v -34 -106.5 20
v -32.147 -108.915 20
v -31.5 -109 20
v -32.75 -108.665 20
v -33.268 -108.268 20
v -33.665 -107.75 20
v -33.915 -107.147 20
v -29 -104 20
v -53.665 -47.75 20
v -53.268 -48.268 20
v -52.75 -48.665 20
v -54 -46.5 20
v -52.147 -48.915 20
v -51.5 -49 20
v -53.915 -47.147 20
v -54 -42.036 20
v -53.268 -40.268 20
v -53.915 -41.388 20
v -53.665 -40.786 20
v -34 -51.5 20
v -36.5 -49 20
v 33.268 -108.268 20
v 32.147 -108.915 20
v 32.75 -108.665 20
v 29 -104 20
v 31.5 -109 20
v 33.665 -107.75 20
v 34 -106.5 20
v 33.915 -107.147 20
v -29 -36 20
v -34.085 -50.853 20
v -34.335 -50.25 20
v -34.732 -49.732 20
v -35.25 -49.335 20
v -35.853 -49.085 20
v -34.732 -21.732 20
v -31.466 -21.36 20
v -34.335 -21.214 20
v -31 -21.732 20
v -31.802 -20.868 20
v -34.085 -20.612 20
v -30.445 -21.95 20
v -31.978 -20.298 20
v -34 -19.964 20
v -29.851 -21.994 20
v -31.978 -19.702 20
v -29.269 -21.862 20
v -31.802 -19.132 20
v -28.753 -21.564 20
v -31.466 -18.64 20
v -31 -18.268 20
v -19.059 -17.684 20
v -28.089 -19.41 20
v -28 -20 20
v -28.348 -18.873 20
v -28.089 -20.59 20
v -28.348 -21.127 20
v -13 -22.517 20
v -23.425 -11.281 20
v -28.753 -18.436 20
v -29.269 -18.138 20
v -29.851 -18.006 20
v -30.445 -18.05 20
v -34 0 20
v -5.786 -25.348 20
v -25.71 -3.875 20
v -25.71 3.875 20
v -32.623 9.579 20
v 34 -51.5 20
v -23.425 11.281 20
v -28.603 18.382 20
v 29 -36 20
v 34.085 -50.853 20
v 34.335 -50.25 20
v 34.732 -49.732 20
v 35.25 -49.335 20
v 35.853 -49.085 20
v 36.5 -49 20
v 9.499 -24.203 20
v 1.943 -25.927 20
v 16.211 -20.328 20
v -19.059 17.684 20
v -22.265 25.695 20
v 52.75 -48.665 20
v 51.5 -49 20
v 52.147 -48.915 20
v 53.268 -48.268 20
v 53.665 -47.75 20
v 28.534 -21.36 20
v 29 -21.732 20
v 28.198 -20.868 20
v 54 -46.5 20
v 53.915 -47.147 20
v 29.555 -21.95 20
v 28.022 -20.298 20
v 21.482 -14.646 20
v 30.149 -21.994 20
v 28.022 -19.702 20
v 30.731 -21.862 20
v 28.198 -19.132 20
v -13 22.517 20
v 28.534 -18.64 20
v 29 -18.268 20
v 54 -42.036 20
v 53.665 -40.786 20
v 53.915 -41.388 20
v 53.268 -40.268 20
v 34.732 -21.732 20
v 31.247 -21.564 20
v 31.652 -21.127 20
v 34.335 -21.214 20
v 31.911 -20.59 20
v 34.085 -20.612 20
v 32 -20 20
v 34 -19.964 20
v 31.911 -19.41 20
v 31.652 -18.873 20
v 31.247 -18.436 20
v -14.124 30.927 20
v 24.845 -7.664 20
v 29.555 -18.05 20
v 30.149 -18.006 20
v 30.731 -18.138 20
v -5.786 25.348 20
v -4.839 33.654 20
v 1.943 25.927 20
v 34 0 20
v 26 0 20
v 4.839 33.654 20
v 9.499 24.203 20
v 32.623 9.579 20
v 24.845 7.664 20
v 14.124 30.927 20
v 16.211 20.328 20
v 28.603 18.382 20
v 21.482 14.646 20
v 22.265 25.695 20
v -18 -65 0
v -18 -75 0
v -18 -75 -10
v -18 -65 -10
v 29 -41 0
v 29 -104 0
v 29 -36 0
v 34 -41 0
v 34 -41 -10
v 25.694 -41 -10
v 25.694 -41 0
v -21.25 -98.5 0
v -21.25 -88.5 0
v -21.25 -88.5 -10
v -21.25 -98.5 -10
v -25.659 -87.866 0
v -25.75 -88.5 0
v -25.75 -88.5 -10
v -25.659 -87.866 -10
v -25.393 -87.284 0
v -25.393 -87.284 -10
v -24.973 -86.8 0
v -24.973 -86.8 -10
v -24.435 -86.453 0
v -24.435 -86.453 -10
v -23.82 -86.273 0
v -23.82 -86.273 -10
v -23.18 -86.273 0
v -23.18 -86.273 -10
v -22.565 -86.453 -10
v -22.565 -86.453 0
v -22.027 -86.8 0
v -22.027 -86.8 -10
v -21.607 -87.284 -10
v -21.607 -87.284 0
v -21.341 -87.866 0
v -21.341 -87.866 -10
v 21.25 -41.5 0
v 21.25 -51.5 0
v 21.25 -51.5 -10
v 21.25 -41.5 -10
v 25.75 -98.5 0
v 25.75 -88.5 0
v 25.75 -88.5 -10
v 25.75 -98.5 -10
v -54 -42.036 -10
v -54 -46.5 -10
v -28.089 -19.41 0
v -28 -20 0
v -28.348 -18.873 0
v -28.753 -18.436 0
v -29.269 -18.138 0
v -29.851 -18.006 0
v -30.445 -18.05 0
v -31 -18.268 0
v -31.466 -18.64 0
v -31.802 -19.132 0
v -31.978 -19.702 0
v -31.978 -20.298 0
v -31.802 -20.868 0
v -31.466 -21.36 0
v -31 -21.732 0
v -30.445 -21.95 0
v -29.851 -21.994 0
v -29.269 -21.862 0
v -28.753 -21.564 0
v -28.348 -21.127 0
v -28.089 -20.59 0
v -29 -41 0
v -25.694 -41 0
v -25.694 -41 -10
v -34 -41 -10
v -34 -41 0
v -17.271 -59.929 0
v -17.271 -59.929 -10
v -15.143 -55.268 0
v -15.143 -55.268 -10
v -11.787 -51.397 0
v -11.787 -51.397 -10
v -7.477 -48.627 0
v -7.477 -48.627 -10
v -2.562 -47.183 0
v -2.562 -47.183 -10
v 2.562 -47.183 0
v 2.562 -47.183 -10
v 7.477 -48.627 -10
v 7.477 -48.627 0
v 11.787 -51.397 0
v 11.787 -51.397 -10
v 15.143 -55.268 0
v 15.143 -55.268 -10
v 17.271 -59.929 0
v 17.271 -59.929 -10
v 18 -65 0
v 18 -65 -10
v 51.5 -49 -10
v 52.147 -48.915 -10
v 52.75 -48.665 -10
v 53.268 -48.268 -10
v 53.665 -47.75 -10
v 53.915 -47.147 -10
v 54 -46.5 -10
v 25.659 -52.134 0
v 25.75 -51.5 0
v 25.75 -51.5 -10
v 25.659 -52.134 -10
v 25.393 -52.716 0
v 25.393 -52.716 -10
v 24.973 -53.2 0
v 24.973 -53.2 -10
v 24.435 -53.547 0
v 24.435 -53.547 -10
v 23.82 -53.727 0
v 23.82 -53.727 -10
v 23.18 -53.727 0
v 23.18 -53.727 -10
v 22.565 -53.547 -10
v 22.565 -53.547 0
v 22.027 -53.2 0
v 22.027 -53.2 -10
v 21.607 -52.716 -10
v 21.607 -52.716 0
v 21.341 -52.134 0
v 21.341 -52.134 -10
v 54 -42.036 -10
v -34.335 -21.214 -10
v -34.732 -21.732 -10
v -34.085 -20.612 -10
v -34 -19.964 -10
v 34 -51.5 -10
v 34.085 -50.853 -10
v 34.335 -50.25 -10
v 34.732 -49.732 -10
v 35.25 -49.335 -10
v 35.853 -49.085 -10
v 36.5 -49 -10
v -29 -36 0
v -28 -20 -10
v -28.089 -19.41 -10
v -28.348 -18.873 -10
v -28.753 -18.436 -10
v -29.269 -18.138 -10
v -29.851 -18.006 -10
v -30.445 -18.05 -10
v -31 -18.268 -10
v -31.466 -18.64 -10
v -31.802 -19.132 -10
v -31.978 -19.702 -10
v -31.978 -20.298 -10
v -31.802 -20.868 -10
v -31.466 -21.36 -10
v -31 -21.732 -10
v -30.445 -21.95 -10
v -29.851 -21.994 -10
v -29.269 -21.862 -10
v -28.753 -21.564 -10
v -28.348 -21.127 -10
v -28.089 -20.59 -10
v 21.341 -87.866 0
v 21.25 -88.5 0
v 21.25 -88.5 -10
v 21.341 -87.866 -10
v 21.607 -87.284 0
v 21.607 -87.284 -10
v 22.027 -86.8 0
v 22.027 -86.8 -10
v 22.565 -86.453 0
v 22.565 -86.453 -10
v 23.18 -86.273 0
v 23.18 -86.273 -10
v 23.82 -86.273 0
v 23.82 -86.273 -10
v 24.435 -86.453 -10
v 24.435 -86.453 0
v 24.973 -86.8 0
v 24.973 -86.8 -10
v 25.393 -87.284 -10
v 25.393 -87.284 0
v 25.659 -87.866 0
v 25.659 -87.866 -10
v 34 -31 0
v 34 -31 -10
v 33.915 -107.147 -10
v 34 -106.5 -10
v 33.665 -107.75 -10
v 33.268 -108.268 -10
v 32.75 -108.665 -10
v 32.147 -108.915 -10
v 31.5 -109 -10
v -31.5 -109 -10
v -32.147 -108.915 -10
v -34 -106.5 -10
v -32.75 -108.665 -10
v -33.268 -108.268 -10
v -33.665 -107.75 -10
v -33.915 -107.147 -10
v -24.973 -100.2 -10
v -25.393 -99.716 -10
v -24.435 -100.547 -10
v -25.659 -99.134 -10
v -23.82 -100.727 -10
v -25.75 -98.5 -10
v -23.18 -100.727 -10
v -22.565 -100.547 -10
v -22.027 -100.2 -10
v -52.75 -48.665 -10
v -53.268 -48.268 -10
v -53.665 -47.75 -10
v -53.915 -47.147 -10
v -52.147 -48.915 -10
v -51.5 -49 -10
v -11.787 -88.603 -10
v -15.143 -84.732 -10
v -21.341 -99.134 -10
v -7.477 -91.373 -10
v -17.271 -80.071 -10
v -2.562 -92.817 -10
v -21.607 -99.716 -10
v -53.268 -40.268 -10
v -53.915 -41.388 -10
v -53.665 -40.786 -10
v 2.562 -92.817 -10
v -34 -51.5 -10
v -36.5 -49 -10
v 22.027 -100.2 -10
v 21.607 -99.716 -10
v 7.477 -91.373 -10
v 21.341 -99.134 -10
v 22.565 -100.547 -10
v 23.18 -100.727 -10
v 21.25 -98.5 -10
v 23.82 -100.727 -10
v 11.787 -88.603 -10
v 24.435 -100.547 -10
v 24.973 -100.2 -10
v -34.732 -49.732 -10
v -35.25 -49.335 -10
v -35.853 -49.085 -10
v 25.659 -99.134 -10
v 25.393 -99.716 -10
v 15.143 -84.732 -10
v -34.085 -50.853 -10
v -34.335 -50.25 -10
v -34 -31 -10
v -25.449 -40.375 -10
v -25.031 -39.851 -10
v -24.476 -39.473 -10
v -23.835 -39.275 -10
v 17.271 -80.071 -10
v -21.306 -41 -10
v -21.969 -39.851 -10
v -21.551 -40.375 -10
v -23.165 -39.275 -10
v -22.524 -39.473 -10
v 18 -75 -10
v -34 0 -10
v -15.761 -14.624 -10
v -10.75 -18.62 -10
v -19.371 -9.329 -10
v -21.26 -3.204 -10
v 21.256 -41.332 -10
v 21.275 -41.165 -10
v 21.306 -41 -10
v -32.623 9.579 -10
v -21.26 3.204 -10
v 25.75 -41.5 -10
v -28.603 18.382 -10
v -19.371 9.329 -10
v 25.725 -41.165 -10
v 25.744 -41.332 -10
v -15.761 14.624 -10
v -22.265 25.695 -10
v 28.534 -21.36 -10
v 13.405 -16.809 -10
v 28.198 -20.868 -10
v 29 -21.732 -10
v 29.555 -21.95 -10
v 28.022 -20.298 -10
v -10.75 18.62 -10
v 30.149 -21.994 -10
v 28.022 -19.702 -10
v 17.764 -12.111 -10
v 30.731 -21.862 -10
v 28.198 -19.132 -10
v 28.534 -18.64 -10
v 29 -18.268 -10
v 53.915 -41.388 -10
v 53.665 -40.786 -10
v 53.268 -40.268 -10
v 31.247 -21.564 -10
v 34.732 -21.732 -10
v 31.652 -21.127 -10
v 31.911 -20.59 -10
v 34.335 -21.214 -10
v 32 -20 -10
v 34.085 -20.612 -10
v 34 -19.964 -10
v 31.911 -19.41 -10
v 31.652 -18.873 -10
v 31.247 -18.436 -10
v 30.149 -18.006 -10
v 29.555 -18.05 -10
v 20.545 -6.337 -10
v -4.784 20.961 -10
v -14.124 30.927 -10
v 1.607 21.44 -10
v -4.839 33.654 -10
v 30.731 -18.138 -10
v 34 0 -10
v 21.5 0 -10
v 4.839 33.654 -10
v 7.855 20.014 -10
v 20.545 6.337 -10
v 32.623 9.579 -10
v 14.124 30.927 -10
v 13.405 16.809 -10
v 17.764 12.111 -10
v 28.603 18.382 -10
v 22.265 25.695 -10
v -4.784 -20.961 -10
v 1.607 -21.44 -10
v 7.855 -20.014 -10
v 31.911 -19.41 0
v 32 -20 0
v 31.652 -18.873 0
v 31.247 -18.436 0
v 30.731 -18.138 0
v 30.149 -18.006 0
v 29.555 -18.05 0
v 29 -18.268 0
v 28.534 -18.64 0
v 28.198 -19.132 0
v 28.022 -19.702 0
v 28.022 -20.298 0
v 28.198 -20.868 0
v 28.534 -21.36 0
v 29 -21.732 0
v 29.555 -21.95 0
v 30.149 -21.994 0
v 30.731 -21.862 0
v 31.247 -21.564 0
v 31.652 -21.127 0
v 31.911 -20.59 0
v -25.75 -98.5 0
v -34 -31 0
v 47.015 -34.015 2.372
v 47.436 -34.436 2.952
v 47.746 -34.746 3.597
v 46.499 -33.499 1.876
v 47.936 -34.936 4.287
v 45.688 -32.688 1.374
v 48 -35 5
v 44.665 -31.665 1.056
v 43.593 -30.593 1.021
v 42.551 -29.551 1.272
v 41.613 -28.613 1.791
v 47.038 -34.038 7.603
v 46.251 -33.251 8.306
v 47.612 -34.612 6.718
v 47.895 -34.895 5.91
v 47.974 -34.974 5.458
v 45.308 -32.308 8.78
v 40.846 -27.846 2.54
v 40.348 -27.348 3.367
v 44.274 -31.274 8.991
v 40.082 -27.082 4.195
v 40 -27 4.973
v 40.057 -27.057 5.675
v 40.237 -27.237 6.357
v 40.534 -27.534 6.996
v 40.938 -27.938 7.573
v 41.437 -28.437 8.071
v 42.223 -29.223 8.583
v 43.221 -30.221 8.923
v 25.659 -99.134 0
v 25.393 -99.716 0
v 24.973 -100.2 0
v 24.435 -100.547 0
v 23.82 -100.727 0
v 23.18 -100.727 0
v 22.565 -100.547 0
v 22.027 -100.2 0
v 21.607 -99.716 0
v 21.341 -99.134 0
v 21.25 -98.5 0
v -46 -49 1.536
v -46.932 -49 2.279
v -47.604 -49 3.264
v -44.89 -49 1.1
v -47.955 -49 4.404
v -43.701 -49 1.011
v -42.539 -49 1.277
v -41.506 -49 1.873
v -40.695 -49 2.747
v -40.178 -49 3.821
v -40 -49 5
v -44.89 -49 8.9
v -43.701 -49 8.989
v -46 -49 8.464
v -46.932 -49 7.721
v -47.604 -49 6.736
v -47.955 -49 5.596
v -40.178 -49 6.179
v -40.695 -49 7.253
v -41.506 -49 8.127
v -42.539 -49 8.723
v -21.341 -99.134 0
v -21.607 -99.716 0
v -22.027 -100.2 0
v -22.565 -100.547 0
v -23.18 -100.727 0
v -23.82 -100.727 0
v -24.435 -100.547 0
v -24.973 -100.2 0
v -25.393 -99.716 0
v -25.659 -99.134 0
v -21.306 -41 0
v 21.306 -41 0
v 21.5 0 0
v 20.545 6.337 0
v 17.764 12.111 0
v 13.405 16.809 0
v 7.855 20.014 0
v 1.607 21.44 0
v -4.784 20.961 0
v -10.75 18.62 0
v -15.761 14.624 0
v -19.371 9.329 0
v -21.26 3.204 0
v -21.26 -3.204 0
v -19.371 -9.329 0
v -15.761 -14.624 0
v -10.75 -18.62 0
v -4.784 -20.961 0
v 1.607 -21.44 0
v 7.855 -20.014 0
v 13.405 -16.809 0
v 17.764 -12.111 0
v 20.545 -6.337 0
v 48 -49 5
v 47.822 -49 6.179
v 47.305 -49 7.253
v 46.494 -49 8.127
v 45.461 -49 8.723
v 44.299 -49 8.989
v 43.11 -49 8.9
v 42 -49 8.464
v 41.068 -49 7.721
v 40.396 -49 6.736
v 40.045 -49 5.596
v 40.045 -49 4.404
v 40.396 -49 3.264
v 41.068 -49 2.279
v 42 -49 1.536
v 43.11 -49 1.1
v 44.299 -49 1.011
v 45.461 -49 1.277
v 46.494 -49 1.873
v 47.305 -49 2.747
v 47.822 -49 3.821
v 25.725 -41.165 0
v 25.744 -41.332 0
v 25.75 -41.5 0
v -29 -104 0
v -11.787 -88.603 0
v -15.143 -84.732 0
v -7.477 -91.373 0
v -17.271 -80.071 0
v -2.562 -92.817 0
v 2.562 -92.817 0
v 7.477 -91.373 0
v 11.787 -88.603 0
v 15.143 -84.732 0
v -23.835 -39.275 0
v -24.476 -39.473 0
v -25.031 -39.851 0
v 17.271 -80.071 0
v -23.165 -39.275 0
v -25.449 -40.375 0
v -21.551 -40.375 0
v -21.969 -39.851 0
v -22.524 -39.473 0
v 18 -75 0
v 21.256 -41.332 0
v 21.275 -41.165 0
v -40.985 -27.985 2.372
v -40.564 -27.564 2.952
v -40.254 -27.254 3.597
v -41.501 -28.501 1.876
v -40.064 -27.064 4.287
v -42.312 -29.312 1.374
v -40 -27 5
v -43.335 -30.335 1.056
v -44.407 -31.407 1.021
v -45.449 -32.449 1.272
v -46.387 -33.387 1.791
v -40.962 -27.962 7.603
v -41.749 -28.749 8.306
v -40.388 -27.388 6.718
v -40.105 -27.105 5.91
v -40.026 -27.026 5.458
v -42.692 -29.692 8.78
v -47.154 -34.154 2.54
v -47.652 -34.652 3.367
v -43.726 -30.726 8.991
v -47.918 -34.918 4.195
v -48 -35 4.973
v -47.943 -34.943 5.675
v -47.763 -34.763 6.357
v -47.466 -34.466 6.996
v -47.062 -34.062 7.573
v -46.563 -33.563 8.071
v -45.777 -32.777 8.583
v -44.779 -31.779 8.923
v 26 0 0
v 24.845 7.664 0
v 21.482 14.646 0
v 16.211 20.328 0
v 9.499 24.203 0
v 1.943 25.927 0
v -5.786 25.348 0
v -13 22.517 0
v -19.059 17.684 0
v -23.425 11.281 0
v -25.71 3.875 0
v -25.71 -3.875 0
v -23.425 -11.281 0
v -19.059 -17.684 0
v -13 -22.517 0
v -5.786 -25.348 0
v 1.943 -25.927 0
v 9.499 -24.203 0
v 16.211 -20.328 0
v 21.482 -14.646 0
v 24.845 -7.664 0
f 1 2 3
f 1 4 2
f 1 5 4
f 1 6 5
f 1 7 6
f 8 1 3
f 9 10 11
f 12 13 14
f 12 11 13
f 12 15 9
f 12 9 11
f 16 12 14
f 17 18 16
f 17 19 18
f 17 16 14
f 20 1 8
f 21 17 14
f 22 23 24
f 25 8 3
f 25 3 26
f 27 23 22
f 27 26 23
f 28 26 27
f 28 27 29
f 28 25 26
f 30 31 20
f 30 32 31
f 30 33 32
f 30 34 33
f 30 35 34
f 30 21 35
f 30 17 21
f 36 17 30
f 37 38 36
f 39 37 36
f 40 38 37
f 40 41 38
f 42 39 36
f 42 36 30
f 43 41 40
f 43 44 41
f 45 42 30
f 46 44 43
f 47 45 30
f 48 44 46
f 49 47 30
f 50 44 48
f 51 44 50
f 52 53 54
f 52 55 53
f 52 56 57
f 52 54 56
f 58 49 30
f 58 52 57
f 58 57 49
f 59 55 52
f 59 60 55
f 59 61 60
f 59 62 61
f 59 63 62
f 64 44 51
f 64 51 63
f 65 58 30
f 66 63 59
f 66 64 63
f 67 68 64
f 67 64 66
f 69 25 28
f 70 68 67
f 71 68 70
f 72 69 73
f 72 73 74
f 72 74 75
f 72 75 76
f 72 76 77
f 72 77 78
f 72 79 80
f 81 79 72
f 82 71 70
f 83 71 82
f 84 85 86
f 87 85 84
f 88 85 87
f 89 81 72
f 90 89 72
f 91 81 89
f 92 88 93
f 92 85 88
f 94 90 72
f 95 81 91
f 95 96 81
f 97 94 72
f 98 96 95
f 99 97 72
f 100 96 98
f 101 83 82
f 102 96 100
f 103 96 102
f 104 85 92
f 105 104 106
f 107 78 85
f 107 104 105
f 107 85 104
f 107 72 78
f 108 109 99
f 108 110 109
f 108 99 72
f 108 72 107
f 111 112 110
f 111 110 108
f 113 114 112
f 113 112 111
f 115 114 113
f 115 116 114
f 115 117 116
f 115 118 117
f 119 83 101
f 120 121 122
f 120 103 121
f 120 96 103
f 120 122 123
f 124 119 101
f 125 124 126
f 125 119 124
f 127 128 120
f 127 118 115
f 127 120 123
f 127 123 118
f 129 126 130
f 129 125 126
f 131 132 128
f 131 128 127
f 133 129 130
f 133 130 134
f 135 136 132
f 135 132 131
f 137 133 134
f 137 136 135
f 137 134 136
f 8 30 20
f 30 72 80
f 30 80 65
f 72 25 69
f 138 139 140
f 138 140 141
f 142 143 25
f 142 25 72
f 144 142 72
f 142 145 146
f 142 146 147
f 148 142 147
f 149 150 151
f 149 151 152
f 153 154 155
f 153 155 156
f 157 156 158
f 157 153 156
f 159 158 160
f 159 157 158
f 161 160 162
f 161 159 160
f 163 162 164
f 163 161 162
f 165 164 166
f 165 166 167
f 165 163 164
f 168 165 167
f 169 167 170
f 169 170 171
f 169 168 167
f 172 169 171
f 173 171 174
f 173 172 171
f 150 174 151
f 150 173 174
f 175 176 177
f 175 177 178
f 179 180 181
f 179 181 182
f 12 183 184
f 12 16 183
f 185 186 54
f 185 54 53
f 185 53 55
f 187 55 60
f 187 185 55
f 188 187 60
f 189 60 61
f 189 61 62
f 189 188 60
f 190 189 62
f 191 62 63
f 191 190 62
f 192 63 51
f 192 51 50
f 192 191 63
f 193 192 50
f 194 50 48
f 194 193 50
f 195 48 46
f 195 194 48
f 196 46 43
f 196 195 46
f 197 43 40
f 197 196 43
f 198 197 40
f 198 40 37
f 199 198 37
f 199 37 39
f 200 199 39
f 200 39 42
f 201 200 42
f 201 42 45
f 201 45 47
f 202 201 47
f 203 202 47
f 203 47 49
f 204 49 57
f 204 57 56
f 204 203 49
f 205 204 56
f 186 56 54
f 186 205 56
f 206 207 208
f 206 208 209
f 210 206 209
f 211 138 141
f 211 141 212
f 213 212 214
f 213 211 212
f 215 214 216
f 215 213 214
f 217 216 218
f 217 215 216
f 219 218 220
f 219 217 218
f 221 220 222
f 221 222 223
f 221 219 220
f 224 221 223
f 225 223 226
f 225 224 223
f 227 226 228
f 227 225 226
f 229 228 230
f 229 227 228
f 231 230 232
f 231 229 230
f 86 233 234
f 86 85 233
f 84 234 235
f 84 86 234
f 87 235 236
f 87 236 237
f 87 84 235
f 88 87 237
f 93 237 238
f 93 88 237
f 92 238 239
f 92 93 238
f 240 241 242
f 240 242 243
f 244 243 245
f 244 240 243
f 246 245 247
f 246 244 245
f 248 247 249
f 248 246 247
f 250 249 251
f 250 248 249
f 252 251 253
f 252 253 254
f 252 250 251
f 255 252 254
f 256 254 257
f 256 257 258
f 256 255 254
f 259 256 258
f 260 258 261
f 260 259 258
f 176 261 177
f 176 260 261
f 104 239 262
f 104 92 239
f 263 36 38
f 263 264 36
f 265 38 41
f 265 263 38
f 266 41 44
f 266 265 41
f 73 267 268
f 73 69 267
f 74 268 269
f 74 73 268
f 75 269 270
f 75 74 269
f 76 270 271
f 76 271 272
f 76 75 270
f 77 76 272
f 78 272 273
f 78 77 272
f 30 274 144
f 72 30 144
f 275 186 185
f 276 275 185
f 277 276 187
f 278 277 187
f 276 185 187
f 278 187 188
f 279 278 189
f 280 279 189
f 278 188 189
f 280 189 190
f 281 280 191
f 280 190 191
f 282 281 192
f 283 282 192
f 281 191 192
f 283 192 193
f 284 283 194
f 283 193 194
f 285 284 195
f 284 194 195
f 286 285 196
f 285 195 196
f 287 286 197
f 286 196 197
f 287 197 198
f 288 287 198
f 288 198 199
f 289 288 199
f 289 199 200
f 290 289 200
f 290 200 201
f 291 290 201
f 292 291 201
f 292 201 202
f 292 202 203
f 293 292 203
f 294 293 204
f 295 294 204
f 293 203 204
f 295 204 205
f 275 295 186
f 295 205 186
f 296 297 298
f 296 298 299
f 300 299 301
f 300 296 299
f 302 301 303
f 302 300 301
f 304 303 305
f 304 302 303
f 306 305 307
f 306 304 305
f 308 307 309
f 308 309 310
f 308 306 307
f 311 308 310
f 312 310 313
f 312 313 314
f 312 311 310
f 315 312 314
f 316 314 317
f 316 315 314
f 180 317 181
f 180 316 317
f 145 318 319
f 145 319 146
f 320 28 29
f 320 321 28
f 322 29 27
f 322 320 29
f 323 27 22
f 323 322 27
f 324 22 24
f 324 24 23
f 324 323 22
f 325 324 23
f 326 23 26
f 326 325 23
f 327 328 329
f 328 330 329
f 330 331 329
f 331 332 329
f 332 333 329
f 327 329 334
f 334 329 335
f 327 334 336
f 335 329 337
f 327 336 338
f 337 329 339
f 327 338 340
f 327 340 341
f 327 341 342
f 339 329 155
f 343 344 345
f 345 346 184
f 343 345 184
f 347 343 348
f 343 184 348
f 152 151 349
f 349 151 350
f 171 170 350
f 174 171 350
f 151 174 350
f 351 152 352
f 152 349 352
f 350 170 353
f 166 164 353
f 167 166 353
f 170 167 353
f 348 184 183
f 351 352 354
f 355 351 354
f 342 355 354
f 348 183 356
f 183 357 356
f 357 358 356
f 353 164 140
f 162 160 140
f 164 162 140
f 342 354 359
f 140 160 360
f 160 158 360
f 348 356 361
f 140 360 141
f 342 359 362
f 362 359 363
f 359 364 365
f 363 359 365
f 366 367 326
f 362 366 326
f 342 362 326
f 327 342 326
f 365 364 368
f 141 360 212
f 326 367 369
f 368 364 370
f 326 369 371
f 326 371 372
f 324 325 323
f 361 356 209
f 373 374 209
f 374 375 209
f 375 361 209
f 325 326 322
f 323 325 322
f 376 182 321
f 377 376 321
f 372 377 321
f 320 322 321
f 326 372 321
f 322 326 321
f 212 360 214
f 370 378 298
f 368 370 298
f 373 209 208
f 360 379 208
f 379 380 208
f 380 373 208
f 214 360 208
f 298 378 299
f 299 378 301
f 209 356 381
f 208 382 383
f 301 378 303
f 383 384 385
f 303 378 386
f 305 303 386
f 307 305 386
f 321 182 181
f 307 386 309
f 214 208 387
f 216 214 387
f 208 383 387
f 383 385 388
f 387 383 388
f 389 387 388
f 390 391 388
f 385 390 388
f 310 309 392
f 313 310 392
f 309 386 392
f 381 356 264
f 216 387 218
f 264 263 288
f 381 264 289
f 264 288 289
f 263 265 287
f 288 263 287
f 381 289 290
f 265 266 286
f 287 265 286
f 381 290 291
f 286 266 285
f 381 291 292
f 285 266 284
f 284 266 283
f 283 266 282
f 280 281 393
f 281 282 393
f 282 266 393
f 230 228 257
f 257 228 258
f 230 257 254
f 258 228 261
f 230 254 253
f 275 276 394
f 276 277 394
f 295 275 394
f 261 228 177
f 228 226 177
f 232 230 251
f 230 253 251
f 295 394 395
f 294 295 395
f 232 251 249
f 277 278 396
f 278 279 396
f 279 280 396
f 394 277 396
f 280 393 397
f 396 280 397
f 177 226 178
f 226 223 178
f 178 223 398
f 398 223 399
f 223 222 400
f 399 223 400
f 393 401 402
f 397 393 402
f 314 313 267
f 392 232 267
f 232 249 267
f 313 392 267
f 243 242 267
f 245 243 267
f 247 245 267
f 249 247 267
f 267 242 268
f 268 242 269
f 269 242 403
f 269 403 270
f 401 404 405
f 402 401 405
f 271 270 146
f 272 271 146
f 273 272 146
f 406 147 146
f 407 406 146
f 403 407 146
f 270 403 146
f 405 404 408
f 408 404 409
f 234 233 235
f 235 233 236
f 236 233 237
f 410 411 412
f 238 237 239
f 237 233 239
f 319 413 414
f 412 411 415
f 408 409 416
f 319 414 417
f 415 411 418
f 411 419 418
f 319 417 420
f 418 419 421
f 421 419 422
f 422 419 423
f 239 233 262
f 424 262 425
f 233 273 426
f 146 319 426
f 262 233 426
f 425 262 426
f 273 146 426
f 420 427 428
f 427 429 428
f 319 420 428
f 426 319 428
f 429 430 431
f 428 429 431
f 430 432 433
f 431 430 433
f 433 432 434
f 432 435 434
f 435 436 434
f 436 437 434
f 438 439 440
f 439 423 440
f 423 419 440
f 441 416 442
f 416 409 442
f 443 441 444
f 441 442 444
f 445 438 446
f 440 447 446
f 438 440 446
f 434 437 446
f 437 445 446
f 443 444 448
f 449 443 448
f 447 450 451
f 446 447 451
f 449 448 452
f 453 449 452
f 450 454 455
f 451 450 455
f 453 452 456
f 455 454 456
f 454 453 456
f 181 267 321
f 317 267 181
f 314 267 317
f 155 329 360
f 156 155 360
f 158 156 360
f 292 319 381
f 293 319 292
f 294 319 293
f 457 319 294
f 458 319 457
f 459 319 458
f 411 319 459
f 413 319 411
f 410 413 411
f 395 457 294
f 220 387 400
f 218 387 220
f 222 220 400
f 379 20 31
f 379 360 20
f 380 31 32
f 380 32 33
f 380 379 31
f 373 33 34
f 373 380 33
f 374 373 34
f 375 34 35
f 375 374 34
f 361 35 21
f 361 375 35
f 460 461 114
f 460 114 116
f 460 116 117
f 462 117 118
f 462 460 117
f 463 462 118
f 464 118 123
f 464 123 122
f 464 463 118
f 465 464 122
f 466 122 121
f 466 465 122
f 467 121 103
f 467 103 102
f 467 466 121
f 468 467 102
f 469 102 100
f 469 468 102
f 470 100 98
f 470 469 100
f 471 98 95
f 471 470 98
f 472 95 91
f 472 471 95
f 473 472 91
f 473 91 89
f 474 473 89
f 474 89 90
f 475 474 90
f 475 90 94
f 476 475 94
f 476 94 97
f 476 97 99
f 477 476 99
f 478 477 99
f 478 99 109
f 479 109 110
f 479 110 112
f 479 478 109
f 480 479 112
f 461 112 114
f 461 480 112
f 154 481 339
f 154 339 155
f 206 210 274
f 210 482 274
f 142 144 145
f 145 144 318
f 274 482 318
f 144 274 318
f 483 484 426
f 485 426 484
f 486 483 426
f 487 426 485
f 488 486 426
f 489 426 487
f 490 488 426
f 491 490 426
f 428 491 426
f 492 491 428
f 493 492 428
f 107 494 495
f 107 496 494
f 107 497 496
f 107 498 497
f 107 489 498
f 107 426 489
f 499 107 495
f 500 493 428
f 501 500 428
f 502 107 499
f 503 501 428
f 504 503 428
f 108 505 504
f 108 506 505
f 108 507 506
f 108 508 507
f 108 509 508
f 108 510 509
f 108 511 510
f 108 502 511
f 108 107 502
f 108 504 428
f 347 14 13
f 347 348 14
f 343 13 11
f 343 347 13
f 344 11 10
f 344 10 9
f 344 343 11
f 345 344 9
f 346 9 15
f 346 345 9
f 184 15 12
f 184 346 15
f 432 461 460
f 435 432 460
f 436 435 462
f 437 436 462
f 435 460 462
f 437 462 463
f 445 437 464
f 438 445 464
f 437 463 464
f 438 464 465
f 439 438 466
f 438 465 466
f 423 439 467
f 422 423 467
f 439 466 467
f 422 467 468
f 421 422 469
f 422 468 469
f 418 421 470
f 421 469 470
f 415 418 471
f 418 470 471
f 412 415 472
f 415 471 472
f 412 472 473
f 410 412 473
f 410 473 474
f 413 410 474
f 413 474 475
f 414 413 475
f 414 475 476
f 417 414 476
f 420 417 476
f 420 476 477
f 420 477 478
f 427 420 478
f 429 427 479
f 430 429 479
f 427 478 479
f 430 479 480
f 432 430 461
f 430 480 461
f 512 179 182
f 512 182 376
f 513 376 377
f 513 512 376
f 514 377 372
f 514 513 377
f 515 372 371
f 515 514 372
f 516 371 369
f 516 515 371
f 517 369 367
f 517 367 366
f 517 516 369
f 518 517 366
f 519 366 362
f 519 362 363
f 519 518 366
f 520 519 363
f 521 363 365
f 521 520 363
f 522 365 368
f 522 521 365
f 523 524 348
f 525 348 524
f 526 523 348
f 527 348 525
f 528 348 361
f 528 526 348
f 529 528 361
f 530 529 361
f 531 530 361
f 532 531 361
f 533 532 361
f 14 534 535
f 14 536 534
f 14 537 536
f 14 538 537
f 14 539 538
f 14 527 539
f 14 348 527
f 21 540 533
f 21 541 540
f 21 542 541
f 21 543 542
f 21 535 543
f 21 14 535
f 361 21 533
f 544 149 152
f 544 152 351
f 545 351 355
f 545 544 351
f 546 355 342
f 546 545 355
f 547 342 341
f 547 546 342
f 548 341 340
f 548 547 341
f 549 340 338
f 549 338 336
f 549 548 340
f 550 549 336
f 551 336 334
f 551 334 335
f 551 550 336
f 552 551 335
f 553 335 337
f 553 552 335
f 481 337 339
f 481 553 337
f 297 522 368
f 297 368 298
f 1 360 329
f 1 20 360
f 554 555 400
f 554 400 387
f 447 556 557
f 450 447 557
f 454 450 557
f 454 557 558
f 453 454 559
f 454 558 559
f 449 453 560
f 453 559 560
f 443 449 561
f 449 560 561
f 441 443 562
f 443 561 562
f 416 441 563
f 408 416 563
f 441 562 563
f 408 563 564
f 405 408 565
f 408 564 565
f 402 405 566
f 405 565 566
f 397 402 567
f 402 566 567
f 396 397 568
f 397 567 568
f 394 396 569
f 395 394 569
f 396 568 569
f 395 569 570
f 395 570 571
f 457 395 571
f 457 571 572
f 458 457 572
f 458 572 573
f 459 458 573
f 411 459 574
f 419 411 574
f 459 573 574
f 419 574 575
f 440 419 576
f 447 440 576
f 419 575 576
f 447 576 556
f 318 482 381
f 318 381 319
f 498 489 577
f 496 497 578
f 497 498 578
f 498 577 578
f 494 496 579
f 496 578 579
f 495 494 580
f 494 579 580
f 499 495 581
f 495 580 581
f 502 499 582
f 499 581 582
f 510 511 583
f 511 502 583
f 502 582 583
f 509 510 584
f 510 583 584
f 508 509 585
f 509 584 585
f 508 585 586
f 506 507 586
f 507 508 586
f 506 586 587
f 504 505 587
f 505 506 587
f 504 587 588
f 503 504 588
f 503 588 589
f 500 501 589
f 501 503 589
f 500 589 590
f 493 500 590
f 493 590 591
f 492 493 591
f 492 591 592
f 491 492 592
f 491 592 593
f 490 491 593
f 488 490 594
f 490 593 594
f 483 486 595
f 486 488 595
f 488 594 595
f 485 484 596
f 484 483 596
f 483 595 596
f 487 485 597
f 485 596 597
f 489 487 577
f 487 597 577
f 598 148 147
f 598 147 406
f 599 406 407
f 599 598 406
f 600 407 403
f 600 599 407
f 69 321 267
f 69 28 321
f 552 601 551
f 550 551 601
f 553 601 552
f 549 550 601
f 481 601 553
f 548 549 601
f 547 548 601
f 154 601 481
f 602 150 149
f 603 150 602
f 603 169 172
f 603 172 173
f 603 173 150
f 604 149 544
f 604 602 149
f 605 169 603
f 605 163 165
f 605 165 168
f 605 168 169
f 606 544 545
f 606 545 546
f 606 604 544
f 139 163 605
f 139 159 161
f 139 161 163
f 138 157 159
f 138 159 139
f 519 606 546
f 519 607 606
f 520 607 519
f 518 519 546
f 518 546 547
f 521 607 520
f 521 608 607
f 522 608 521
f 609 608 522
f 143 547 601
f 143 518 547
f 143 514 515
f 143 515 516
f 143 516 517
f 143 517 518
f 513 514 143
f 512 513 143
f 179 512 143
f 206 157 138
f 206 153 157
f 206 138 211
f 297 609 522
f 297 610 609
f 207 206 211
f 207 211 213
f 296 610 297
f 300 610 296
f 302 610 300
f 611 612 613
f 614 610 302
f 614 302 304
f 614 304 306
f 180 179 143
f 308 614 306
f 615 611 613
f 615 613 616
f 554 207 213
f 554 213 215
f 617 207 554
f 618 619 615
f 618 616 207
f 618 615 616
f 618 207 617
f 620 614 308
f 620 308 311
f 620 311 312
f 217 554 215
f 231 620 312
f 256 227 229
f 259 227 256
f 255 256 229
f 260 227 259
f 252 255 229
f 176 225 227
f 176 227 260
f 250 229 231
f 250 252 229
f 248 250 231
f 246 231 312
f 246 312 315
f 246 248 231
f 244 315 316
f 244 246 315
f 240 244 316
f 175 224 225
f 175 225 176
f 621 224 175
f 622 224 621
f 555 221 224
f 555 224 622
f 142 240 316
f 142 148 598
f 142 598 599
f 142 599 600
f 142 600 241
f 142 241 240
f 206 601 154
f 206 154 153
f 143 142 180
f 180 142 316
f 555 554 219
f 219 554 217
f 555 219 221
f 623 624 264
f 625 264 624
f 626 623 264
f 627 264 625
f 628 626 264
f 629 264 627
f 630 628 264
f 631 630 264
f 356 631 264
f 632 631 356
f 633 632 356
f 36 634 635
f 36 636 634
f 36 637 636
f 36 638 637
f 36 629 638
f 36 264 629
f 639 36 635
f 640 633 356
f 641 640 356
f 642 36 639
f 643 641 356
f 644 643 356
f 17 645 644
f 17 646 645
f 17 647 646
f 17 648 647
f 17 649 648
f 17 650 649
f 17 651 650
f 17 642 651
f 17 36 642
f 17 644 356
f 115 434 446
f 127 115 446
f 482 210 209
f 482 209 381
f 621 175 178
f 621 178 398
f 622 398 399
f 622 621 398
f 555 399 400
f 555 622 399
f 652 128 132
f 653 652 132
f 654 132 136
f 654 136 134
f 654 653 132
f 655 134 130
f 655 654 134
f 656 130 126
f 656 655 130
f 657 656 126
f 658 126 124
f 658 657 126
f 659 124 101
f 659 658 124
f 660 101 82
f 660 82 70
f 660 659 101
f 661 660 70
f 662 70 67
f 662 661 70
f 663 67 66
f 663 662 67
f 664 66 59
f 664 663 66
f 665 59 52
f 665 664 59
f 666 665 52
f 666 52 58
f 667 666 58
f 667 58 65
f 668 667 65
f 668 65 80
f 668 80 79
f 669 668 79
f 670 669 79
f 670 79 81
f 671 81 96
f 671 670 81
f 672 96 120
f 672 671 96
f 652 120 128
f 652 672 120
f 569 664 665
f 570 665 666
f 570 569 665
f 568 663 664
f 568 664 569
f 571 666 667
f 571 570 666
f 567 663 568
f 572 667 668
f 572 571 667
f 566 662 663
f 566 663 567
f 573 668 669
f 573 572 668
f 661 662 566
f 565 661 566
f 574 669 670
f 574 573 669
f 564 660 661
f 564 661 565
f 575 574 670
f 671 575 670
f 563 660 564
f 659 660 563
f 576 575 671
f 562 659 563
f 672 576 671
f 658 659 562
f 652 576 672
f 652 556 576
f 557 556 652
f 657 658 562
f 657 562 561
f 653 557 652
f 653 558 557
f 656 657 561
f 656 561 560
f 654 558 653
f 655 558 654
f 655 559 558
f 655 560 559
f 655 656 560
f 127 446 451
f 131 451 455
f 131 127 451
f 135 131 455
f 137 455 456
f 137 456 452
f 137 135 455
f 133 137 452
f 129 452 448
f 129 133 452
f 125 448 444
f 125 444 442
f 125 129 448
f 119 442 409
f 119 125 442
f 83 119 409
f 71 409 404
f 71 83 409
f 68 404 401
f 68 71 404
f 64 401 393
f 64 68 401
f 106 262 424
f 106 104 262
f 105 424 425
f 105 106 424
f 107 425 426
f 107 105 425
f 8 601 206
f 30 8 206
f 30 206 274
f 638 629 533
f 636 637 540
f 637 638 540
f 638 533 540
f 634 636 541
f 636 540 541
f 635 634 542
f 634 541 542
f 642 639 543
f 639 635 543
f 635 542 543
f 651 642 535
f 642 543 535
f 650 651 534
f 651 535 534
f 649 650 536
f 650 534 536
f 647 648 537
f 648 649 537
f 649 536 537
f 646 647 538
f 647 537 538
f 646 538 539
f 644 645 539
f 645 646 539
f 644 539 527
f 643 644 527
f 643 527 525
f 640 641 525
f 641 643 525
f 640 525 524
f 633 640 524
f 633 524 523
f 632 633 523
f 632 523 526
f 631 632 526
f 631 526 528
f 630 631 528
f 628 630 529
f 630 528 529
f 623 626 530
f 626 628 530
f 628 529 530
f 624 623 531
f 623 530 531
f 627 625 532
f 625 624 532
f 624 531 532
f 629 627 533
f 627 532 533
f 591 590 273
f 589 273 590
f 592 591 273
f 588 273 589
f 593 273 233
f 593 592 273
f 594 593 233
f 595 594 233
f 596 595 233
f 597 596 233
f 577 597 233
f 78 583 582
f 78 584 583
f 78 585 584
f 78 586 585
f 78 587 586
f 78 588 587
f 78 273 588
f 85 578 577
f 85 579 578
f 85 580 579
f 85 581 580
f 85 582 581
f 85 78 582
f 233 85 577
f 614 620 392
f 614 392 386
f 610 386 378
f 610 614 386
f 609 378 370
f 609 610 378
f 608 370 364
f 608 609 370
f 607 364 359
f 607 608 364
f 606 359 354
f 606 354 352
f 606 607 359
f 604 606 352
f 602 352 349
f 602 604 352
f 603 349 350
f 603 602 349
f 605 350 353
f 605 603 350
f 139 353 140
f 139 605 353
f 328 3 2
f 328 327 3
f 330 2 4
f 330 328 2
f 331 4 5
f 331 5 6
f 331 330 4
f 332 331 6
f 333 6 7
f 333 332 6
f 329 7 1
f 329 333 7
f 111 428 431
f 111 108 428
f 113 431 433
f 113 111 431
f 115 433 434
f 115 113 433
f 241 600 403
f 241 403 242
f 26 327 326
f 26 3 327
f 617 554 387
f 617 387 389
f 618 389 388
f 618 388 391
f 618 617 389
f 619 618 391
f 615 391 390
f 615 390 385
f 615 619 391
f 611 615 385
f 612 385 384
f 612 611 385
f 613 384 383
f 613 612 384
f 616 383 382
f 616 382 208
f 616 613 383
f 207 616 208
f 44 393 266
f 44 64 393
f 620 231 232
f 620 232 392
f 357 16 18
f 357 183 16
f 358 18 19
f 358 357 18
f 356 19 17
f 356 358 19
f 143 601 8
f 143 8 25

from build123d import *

# Parameters (mm, degrees)
ESQUISSE1_R             = 2
ESQUISSE1_W             = 58
ESQUISSE1_H             = 68
ESQUISSE1_R_2           = 26
BOSS_EXTRU_1_DEPTH      = 20
ESQUISSE1_4_R           = 2
ESQUISSE1_4_R_2         = 21.5
BOSS_EXTRU_2_DEPTH      = 10
ESQUISSE2_R             = 4
ENL_V_MAT_EXTRU_2_DEPTH = 84
CONG_1_R                = 2.5


with BuildPart() as part:
    # Esquisse1 → Boss.-Extru.1 (new body)
    with BuildSketch(Plane.XY):
        with BuildLine():
            Line((34, -109), (34, -49))
            Line((34, -49), (54, -49))
            Line((54, -49), (54, -41))
            Line((54, -41), (34, -21))
            Line((34, -21), (34, 0))
            ThreePointArc((34, 0), (0, 34), (-34, 0))
            Line((-34, 0), (-34, -21))
            Line((-34, -21), (-54, -41))
            Line((-54, -41), (-54, -49))
            Line((-54, -49), (-34, -49))
            Line((-34, -49), (-34, -109))
            Line((-34, -109), (34, -109))
        make_face()
        with Locations((-30, -20)):
            Circle(ESQUISSE1_R, mode=Mode.SUBTRACT)
        with Locations((0, -70)):
            Rectangle(ESQUISSE1_W, ESQUISSE1_H, mode=Mode.SUBTRACT)
        Circle(ESQUISSE1_R_2, mode=Mode.SUBTRACT)
        with Locations((30, -20)):
            Circle(ESQUISSE1_R, mode=Mode.SUBTRACT)
    extrude(amount=BOSS_EXTRU_1_DEPTH)

    # Esquisse1<4> → Boss.-Extru.2 (add)
    with BuildSketch(Plane.XY):
        with BuildLine():
            Line((34, -109), (34, -49))
            Line((34, -49), (54, -49))
            Line((54, -49), (54, -41))
            Line((54, -41), (34, -21))
            Line((34, -21), (34, 0))
            ThreePointArc((34, 0), (0, 34), (-34, 0))
            Line((-34, 0), (-34, -21))
            Line((-34, -21), (-54, -41))
            Line((-54, -41), (-54, -49))
            Line((-54, -49), (-34, -49))
            Line((-34, -49), (-34, -109))
            Line((-34, -109), (34, -109))
        make_face()
        with Locations((-30, -20)):
            Circle(ESQUISSE1_4_R, mode=Mode.SUBTRACT)
        with BuildLine():
            Line((34, -31), (34, -41))
            Line((34, -41), (25.693741097, -41))
            ThreePointArc((25.693741097, -41), (25.735891038, -41.248422445), (25.75, -41.5))
            Line((25.75, -41.5), (25.75, -51.5))
            ThreePointArc((25.75, -51.5), (23.5, -53.75), (21.25, -51.5))
            Line((21.25, -51.5), (21.25, -41.5))
            ThreePointArc((21.25, -41.5), (21.264108962, -41.248422445), (21.306258903, -41))
            Line((21.306258903, -41), (-21.306258903, -41))
            ThreePointArc((-21.306258903, -41), (-23.5, -39.25), (-25.693741097, -41))
            Line((-25.693741097, -41), (-34, -41))
            Line((-34, -41), (-34, -31))
            Line((-34, -31), (34, -31))
        make_face(mode=Mode.SUBTRACT)
        with BuildLine():
            ThreePointArc((18, -75), (0, -93), (-18, -75))
            Line((-18, -75), (-18, -65))
            ThreePointArc((-18, -65), (0, -47), (18, -65))
            Line((18, -65), (18, -75))
        make_face(mode=Mode.SUBTRACT)
        with BuildLine():
            Line((25.75, -88.5), (25.75, -98.5))
            ThreePointArc((25.75, -98.5), (23.5, -100.75), (21.25, -98.5))
            Line((21.25, -98.5), (21.25, -88.5))
            ThreePointArc((21.25, -88.5), (23.5, -86.25), (25.75, -88.5))
        make_face(mode=Mode.SUBTRACT)
        with BuildLine():
            ThreePointArc((-21.25, -98.5), (-23.5, -100.75), (-25.75, -98.5))
            Line((-25.75, -98.5), (-25.75, -88.5))
            ThreePointArc((-25.75, -88.5), (-23.5, -86.25), (-21.25, -88.5))
            Line((-21.25, -88.5), (-21.25, -98.5))
        make_face(mode=Mode.SUBTRACT)
        Circle(ESQUISSE1_4_R_2, mode=Mode.SUBTRACT)
        with Locations((30, -20)):
            Circle(ESQUISSE1_4_R, mode=Mode.SUBTRACT)
    extrude(amount=-BOSS_EXTRU_2_DEPTH)

    # Esquisse2 → Enlèv. mat.-Extru.2 (cut, through all)
    with BuildSketch(Plane.XZ.offset(49)):
        with Locations((44, 5)):
            Circle(ESQUISSE2_R)
        with Locations((-44, 5)):
            Circle(ESQUISSE2_R)
    extrude(amount=-ENL_V_MAT_EXTRU_2_DEPTH, mode=Mode.SUBTRACT)

    # Congé1
    cong_1_edges = [part.edges().sort_by_distance(p)[0] for p in [
        (34, -21, 5),
        (54, -41, 5),
        (54, -49, 5),
        (34, -49, 5),
        (34, -109, 5),
        (-34, -109, 5),
        (-34, -49, 5),
        (-54, -49, 5),
        (-54, -41, 5),
        (-34, -21, 5),
    ]]
    fillet(cong_1_edges, radius=CONG_1_R)


solid = part.part
